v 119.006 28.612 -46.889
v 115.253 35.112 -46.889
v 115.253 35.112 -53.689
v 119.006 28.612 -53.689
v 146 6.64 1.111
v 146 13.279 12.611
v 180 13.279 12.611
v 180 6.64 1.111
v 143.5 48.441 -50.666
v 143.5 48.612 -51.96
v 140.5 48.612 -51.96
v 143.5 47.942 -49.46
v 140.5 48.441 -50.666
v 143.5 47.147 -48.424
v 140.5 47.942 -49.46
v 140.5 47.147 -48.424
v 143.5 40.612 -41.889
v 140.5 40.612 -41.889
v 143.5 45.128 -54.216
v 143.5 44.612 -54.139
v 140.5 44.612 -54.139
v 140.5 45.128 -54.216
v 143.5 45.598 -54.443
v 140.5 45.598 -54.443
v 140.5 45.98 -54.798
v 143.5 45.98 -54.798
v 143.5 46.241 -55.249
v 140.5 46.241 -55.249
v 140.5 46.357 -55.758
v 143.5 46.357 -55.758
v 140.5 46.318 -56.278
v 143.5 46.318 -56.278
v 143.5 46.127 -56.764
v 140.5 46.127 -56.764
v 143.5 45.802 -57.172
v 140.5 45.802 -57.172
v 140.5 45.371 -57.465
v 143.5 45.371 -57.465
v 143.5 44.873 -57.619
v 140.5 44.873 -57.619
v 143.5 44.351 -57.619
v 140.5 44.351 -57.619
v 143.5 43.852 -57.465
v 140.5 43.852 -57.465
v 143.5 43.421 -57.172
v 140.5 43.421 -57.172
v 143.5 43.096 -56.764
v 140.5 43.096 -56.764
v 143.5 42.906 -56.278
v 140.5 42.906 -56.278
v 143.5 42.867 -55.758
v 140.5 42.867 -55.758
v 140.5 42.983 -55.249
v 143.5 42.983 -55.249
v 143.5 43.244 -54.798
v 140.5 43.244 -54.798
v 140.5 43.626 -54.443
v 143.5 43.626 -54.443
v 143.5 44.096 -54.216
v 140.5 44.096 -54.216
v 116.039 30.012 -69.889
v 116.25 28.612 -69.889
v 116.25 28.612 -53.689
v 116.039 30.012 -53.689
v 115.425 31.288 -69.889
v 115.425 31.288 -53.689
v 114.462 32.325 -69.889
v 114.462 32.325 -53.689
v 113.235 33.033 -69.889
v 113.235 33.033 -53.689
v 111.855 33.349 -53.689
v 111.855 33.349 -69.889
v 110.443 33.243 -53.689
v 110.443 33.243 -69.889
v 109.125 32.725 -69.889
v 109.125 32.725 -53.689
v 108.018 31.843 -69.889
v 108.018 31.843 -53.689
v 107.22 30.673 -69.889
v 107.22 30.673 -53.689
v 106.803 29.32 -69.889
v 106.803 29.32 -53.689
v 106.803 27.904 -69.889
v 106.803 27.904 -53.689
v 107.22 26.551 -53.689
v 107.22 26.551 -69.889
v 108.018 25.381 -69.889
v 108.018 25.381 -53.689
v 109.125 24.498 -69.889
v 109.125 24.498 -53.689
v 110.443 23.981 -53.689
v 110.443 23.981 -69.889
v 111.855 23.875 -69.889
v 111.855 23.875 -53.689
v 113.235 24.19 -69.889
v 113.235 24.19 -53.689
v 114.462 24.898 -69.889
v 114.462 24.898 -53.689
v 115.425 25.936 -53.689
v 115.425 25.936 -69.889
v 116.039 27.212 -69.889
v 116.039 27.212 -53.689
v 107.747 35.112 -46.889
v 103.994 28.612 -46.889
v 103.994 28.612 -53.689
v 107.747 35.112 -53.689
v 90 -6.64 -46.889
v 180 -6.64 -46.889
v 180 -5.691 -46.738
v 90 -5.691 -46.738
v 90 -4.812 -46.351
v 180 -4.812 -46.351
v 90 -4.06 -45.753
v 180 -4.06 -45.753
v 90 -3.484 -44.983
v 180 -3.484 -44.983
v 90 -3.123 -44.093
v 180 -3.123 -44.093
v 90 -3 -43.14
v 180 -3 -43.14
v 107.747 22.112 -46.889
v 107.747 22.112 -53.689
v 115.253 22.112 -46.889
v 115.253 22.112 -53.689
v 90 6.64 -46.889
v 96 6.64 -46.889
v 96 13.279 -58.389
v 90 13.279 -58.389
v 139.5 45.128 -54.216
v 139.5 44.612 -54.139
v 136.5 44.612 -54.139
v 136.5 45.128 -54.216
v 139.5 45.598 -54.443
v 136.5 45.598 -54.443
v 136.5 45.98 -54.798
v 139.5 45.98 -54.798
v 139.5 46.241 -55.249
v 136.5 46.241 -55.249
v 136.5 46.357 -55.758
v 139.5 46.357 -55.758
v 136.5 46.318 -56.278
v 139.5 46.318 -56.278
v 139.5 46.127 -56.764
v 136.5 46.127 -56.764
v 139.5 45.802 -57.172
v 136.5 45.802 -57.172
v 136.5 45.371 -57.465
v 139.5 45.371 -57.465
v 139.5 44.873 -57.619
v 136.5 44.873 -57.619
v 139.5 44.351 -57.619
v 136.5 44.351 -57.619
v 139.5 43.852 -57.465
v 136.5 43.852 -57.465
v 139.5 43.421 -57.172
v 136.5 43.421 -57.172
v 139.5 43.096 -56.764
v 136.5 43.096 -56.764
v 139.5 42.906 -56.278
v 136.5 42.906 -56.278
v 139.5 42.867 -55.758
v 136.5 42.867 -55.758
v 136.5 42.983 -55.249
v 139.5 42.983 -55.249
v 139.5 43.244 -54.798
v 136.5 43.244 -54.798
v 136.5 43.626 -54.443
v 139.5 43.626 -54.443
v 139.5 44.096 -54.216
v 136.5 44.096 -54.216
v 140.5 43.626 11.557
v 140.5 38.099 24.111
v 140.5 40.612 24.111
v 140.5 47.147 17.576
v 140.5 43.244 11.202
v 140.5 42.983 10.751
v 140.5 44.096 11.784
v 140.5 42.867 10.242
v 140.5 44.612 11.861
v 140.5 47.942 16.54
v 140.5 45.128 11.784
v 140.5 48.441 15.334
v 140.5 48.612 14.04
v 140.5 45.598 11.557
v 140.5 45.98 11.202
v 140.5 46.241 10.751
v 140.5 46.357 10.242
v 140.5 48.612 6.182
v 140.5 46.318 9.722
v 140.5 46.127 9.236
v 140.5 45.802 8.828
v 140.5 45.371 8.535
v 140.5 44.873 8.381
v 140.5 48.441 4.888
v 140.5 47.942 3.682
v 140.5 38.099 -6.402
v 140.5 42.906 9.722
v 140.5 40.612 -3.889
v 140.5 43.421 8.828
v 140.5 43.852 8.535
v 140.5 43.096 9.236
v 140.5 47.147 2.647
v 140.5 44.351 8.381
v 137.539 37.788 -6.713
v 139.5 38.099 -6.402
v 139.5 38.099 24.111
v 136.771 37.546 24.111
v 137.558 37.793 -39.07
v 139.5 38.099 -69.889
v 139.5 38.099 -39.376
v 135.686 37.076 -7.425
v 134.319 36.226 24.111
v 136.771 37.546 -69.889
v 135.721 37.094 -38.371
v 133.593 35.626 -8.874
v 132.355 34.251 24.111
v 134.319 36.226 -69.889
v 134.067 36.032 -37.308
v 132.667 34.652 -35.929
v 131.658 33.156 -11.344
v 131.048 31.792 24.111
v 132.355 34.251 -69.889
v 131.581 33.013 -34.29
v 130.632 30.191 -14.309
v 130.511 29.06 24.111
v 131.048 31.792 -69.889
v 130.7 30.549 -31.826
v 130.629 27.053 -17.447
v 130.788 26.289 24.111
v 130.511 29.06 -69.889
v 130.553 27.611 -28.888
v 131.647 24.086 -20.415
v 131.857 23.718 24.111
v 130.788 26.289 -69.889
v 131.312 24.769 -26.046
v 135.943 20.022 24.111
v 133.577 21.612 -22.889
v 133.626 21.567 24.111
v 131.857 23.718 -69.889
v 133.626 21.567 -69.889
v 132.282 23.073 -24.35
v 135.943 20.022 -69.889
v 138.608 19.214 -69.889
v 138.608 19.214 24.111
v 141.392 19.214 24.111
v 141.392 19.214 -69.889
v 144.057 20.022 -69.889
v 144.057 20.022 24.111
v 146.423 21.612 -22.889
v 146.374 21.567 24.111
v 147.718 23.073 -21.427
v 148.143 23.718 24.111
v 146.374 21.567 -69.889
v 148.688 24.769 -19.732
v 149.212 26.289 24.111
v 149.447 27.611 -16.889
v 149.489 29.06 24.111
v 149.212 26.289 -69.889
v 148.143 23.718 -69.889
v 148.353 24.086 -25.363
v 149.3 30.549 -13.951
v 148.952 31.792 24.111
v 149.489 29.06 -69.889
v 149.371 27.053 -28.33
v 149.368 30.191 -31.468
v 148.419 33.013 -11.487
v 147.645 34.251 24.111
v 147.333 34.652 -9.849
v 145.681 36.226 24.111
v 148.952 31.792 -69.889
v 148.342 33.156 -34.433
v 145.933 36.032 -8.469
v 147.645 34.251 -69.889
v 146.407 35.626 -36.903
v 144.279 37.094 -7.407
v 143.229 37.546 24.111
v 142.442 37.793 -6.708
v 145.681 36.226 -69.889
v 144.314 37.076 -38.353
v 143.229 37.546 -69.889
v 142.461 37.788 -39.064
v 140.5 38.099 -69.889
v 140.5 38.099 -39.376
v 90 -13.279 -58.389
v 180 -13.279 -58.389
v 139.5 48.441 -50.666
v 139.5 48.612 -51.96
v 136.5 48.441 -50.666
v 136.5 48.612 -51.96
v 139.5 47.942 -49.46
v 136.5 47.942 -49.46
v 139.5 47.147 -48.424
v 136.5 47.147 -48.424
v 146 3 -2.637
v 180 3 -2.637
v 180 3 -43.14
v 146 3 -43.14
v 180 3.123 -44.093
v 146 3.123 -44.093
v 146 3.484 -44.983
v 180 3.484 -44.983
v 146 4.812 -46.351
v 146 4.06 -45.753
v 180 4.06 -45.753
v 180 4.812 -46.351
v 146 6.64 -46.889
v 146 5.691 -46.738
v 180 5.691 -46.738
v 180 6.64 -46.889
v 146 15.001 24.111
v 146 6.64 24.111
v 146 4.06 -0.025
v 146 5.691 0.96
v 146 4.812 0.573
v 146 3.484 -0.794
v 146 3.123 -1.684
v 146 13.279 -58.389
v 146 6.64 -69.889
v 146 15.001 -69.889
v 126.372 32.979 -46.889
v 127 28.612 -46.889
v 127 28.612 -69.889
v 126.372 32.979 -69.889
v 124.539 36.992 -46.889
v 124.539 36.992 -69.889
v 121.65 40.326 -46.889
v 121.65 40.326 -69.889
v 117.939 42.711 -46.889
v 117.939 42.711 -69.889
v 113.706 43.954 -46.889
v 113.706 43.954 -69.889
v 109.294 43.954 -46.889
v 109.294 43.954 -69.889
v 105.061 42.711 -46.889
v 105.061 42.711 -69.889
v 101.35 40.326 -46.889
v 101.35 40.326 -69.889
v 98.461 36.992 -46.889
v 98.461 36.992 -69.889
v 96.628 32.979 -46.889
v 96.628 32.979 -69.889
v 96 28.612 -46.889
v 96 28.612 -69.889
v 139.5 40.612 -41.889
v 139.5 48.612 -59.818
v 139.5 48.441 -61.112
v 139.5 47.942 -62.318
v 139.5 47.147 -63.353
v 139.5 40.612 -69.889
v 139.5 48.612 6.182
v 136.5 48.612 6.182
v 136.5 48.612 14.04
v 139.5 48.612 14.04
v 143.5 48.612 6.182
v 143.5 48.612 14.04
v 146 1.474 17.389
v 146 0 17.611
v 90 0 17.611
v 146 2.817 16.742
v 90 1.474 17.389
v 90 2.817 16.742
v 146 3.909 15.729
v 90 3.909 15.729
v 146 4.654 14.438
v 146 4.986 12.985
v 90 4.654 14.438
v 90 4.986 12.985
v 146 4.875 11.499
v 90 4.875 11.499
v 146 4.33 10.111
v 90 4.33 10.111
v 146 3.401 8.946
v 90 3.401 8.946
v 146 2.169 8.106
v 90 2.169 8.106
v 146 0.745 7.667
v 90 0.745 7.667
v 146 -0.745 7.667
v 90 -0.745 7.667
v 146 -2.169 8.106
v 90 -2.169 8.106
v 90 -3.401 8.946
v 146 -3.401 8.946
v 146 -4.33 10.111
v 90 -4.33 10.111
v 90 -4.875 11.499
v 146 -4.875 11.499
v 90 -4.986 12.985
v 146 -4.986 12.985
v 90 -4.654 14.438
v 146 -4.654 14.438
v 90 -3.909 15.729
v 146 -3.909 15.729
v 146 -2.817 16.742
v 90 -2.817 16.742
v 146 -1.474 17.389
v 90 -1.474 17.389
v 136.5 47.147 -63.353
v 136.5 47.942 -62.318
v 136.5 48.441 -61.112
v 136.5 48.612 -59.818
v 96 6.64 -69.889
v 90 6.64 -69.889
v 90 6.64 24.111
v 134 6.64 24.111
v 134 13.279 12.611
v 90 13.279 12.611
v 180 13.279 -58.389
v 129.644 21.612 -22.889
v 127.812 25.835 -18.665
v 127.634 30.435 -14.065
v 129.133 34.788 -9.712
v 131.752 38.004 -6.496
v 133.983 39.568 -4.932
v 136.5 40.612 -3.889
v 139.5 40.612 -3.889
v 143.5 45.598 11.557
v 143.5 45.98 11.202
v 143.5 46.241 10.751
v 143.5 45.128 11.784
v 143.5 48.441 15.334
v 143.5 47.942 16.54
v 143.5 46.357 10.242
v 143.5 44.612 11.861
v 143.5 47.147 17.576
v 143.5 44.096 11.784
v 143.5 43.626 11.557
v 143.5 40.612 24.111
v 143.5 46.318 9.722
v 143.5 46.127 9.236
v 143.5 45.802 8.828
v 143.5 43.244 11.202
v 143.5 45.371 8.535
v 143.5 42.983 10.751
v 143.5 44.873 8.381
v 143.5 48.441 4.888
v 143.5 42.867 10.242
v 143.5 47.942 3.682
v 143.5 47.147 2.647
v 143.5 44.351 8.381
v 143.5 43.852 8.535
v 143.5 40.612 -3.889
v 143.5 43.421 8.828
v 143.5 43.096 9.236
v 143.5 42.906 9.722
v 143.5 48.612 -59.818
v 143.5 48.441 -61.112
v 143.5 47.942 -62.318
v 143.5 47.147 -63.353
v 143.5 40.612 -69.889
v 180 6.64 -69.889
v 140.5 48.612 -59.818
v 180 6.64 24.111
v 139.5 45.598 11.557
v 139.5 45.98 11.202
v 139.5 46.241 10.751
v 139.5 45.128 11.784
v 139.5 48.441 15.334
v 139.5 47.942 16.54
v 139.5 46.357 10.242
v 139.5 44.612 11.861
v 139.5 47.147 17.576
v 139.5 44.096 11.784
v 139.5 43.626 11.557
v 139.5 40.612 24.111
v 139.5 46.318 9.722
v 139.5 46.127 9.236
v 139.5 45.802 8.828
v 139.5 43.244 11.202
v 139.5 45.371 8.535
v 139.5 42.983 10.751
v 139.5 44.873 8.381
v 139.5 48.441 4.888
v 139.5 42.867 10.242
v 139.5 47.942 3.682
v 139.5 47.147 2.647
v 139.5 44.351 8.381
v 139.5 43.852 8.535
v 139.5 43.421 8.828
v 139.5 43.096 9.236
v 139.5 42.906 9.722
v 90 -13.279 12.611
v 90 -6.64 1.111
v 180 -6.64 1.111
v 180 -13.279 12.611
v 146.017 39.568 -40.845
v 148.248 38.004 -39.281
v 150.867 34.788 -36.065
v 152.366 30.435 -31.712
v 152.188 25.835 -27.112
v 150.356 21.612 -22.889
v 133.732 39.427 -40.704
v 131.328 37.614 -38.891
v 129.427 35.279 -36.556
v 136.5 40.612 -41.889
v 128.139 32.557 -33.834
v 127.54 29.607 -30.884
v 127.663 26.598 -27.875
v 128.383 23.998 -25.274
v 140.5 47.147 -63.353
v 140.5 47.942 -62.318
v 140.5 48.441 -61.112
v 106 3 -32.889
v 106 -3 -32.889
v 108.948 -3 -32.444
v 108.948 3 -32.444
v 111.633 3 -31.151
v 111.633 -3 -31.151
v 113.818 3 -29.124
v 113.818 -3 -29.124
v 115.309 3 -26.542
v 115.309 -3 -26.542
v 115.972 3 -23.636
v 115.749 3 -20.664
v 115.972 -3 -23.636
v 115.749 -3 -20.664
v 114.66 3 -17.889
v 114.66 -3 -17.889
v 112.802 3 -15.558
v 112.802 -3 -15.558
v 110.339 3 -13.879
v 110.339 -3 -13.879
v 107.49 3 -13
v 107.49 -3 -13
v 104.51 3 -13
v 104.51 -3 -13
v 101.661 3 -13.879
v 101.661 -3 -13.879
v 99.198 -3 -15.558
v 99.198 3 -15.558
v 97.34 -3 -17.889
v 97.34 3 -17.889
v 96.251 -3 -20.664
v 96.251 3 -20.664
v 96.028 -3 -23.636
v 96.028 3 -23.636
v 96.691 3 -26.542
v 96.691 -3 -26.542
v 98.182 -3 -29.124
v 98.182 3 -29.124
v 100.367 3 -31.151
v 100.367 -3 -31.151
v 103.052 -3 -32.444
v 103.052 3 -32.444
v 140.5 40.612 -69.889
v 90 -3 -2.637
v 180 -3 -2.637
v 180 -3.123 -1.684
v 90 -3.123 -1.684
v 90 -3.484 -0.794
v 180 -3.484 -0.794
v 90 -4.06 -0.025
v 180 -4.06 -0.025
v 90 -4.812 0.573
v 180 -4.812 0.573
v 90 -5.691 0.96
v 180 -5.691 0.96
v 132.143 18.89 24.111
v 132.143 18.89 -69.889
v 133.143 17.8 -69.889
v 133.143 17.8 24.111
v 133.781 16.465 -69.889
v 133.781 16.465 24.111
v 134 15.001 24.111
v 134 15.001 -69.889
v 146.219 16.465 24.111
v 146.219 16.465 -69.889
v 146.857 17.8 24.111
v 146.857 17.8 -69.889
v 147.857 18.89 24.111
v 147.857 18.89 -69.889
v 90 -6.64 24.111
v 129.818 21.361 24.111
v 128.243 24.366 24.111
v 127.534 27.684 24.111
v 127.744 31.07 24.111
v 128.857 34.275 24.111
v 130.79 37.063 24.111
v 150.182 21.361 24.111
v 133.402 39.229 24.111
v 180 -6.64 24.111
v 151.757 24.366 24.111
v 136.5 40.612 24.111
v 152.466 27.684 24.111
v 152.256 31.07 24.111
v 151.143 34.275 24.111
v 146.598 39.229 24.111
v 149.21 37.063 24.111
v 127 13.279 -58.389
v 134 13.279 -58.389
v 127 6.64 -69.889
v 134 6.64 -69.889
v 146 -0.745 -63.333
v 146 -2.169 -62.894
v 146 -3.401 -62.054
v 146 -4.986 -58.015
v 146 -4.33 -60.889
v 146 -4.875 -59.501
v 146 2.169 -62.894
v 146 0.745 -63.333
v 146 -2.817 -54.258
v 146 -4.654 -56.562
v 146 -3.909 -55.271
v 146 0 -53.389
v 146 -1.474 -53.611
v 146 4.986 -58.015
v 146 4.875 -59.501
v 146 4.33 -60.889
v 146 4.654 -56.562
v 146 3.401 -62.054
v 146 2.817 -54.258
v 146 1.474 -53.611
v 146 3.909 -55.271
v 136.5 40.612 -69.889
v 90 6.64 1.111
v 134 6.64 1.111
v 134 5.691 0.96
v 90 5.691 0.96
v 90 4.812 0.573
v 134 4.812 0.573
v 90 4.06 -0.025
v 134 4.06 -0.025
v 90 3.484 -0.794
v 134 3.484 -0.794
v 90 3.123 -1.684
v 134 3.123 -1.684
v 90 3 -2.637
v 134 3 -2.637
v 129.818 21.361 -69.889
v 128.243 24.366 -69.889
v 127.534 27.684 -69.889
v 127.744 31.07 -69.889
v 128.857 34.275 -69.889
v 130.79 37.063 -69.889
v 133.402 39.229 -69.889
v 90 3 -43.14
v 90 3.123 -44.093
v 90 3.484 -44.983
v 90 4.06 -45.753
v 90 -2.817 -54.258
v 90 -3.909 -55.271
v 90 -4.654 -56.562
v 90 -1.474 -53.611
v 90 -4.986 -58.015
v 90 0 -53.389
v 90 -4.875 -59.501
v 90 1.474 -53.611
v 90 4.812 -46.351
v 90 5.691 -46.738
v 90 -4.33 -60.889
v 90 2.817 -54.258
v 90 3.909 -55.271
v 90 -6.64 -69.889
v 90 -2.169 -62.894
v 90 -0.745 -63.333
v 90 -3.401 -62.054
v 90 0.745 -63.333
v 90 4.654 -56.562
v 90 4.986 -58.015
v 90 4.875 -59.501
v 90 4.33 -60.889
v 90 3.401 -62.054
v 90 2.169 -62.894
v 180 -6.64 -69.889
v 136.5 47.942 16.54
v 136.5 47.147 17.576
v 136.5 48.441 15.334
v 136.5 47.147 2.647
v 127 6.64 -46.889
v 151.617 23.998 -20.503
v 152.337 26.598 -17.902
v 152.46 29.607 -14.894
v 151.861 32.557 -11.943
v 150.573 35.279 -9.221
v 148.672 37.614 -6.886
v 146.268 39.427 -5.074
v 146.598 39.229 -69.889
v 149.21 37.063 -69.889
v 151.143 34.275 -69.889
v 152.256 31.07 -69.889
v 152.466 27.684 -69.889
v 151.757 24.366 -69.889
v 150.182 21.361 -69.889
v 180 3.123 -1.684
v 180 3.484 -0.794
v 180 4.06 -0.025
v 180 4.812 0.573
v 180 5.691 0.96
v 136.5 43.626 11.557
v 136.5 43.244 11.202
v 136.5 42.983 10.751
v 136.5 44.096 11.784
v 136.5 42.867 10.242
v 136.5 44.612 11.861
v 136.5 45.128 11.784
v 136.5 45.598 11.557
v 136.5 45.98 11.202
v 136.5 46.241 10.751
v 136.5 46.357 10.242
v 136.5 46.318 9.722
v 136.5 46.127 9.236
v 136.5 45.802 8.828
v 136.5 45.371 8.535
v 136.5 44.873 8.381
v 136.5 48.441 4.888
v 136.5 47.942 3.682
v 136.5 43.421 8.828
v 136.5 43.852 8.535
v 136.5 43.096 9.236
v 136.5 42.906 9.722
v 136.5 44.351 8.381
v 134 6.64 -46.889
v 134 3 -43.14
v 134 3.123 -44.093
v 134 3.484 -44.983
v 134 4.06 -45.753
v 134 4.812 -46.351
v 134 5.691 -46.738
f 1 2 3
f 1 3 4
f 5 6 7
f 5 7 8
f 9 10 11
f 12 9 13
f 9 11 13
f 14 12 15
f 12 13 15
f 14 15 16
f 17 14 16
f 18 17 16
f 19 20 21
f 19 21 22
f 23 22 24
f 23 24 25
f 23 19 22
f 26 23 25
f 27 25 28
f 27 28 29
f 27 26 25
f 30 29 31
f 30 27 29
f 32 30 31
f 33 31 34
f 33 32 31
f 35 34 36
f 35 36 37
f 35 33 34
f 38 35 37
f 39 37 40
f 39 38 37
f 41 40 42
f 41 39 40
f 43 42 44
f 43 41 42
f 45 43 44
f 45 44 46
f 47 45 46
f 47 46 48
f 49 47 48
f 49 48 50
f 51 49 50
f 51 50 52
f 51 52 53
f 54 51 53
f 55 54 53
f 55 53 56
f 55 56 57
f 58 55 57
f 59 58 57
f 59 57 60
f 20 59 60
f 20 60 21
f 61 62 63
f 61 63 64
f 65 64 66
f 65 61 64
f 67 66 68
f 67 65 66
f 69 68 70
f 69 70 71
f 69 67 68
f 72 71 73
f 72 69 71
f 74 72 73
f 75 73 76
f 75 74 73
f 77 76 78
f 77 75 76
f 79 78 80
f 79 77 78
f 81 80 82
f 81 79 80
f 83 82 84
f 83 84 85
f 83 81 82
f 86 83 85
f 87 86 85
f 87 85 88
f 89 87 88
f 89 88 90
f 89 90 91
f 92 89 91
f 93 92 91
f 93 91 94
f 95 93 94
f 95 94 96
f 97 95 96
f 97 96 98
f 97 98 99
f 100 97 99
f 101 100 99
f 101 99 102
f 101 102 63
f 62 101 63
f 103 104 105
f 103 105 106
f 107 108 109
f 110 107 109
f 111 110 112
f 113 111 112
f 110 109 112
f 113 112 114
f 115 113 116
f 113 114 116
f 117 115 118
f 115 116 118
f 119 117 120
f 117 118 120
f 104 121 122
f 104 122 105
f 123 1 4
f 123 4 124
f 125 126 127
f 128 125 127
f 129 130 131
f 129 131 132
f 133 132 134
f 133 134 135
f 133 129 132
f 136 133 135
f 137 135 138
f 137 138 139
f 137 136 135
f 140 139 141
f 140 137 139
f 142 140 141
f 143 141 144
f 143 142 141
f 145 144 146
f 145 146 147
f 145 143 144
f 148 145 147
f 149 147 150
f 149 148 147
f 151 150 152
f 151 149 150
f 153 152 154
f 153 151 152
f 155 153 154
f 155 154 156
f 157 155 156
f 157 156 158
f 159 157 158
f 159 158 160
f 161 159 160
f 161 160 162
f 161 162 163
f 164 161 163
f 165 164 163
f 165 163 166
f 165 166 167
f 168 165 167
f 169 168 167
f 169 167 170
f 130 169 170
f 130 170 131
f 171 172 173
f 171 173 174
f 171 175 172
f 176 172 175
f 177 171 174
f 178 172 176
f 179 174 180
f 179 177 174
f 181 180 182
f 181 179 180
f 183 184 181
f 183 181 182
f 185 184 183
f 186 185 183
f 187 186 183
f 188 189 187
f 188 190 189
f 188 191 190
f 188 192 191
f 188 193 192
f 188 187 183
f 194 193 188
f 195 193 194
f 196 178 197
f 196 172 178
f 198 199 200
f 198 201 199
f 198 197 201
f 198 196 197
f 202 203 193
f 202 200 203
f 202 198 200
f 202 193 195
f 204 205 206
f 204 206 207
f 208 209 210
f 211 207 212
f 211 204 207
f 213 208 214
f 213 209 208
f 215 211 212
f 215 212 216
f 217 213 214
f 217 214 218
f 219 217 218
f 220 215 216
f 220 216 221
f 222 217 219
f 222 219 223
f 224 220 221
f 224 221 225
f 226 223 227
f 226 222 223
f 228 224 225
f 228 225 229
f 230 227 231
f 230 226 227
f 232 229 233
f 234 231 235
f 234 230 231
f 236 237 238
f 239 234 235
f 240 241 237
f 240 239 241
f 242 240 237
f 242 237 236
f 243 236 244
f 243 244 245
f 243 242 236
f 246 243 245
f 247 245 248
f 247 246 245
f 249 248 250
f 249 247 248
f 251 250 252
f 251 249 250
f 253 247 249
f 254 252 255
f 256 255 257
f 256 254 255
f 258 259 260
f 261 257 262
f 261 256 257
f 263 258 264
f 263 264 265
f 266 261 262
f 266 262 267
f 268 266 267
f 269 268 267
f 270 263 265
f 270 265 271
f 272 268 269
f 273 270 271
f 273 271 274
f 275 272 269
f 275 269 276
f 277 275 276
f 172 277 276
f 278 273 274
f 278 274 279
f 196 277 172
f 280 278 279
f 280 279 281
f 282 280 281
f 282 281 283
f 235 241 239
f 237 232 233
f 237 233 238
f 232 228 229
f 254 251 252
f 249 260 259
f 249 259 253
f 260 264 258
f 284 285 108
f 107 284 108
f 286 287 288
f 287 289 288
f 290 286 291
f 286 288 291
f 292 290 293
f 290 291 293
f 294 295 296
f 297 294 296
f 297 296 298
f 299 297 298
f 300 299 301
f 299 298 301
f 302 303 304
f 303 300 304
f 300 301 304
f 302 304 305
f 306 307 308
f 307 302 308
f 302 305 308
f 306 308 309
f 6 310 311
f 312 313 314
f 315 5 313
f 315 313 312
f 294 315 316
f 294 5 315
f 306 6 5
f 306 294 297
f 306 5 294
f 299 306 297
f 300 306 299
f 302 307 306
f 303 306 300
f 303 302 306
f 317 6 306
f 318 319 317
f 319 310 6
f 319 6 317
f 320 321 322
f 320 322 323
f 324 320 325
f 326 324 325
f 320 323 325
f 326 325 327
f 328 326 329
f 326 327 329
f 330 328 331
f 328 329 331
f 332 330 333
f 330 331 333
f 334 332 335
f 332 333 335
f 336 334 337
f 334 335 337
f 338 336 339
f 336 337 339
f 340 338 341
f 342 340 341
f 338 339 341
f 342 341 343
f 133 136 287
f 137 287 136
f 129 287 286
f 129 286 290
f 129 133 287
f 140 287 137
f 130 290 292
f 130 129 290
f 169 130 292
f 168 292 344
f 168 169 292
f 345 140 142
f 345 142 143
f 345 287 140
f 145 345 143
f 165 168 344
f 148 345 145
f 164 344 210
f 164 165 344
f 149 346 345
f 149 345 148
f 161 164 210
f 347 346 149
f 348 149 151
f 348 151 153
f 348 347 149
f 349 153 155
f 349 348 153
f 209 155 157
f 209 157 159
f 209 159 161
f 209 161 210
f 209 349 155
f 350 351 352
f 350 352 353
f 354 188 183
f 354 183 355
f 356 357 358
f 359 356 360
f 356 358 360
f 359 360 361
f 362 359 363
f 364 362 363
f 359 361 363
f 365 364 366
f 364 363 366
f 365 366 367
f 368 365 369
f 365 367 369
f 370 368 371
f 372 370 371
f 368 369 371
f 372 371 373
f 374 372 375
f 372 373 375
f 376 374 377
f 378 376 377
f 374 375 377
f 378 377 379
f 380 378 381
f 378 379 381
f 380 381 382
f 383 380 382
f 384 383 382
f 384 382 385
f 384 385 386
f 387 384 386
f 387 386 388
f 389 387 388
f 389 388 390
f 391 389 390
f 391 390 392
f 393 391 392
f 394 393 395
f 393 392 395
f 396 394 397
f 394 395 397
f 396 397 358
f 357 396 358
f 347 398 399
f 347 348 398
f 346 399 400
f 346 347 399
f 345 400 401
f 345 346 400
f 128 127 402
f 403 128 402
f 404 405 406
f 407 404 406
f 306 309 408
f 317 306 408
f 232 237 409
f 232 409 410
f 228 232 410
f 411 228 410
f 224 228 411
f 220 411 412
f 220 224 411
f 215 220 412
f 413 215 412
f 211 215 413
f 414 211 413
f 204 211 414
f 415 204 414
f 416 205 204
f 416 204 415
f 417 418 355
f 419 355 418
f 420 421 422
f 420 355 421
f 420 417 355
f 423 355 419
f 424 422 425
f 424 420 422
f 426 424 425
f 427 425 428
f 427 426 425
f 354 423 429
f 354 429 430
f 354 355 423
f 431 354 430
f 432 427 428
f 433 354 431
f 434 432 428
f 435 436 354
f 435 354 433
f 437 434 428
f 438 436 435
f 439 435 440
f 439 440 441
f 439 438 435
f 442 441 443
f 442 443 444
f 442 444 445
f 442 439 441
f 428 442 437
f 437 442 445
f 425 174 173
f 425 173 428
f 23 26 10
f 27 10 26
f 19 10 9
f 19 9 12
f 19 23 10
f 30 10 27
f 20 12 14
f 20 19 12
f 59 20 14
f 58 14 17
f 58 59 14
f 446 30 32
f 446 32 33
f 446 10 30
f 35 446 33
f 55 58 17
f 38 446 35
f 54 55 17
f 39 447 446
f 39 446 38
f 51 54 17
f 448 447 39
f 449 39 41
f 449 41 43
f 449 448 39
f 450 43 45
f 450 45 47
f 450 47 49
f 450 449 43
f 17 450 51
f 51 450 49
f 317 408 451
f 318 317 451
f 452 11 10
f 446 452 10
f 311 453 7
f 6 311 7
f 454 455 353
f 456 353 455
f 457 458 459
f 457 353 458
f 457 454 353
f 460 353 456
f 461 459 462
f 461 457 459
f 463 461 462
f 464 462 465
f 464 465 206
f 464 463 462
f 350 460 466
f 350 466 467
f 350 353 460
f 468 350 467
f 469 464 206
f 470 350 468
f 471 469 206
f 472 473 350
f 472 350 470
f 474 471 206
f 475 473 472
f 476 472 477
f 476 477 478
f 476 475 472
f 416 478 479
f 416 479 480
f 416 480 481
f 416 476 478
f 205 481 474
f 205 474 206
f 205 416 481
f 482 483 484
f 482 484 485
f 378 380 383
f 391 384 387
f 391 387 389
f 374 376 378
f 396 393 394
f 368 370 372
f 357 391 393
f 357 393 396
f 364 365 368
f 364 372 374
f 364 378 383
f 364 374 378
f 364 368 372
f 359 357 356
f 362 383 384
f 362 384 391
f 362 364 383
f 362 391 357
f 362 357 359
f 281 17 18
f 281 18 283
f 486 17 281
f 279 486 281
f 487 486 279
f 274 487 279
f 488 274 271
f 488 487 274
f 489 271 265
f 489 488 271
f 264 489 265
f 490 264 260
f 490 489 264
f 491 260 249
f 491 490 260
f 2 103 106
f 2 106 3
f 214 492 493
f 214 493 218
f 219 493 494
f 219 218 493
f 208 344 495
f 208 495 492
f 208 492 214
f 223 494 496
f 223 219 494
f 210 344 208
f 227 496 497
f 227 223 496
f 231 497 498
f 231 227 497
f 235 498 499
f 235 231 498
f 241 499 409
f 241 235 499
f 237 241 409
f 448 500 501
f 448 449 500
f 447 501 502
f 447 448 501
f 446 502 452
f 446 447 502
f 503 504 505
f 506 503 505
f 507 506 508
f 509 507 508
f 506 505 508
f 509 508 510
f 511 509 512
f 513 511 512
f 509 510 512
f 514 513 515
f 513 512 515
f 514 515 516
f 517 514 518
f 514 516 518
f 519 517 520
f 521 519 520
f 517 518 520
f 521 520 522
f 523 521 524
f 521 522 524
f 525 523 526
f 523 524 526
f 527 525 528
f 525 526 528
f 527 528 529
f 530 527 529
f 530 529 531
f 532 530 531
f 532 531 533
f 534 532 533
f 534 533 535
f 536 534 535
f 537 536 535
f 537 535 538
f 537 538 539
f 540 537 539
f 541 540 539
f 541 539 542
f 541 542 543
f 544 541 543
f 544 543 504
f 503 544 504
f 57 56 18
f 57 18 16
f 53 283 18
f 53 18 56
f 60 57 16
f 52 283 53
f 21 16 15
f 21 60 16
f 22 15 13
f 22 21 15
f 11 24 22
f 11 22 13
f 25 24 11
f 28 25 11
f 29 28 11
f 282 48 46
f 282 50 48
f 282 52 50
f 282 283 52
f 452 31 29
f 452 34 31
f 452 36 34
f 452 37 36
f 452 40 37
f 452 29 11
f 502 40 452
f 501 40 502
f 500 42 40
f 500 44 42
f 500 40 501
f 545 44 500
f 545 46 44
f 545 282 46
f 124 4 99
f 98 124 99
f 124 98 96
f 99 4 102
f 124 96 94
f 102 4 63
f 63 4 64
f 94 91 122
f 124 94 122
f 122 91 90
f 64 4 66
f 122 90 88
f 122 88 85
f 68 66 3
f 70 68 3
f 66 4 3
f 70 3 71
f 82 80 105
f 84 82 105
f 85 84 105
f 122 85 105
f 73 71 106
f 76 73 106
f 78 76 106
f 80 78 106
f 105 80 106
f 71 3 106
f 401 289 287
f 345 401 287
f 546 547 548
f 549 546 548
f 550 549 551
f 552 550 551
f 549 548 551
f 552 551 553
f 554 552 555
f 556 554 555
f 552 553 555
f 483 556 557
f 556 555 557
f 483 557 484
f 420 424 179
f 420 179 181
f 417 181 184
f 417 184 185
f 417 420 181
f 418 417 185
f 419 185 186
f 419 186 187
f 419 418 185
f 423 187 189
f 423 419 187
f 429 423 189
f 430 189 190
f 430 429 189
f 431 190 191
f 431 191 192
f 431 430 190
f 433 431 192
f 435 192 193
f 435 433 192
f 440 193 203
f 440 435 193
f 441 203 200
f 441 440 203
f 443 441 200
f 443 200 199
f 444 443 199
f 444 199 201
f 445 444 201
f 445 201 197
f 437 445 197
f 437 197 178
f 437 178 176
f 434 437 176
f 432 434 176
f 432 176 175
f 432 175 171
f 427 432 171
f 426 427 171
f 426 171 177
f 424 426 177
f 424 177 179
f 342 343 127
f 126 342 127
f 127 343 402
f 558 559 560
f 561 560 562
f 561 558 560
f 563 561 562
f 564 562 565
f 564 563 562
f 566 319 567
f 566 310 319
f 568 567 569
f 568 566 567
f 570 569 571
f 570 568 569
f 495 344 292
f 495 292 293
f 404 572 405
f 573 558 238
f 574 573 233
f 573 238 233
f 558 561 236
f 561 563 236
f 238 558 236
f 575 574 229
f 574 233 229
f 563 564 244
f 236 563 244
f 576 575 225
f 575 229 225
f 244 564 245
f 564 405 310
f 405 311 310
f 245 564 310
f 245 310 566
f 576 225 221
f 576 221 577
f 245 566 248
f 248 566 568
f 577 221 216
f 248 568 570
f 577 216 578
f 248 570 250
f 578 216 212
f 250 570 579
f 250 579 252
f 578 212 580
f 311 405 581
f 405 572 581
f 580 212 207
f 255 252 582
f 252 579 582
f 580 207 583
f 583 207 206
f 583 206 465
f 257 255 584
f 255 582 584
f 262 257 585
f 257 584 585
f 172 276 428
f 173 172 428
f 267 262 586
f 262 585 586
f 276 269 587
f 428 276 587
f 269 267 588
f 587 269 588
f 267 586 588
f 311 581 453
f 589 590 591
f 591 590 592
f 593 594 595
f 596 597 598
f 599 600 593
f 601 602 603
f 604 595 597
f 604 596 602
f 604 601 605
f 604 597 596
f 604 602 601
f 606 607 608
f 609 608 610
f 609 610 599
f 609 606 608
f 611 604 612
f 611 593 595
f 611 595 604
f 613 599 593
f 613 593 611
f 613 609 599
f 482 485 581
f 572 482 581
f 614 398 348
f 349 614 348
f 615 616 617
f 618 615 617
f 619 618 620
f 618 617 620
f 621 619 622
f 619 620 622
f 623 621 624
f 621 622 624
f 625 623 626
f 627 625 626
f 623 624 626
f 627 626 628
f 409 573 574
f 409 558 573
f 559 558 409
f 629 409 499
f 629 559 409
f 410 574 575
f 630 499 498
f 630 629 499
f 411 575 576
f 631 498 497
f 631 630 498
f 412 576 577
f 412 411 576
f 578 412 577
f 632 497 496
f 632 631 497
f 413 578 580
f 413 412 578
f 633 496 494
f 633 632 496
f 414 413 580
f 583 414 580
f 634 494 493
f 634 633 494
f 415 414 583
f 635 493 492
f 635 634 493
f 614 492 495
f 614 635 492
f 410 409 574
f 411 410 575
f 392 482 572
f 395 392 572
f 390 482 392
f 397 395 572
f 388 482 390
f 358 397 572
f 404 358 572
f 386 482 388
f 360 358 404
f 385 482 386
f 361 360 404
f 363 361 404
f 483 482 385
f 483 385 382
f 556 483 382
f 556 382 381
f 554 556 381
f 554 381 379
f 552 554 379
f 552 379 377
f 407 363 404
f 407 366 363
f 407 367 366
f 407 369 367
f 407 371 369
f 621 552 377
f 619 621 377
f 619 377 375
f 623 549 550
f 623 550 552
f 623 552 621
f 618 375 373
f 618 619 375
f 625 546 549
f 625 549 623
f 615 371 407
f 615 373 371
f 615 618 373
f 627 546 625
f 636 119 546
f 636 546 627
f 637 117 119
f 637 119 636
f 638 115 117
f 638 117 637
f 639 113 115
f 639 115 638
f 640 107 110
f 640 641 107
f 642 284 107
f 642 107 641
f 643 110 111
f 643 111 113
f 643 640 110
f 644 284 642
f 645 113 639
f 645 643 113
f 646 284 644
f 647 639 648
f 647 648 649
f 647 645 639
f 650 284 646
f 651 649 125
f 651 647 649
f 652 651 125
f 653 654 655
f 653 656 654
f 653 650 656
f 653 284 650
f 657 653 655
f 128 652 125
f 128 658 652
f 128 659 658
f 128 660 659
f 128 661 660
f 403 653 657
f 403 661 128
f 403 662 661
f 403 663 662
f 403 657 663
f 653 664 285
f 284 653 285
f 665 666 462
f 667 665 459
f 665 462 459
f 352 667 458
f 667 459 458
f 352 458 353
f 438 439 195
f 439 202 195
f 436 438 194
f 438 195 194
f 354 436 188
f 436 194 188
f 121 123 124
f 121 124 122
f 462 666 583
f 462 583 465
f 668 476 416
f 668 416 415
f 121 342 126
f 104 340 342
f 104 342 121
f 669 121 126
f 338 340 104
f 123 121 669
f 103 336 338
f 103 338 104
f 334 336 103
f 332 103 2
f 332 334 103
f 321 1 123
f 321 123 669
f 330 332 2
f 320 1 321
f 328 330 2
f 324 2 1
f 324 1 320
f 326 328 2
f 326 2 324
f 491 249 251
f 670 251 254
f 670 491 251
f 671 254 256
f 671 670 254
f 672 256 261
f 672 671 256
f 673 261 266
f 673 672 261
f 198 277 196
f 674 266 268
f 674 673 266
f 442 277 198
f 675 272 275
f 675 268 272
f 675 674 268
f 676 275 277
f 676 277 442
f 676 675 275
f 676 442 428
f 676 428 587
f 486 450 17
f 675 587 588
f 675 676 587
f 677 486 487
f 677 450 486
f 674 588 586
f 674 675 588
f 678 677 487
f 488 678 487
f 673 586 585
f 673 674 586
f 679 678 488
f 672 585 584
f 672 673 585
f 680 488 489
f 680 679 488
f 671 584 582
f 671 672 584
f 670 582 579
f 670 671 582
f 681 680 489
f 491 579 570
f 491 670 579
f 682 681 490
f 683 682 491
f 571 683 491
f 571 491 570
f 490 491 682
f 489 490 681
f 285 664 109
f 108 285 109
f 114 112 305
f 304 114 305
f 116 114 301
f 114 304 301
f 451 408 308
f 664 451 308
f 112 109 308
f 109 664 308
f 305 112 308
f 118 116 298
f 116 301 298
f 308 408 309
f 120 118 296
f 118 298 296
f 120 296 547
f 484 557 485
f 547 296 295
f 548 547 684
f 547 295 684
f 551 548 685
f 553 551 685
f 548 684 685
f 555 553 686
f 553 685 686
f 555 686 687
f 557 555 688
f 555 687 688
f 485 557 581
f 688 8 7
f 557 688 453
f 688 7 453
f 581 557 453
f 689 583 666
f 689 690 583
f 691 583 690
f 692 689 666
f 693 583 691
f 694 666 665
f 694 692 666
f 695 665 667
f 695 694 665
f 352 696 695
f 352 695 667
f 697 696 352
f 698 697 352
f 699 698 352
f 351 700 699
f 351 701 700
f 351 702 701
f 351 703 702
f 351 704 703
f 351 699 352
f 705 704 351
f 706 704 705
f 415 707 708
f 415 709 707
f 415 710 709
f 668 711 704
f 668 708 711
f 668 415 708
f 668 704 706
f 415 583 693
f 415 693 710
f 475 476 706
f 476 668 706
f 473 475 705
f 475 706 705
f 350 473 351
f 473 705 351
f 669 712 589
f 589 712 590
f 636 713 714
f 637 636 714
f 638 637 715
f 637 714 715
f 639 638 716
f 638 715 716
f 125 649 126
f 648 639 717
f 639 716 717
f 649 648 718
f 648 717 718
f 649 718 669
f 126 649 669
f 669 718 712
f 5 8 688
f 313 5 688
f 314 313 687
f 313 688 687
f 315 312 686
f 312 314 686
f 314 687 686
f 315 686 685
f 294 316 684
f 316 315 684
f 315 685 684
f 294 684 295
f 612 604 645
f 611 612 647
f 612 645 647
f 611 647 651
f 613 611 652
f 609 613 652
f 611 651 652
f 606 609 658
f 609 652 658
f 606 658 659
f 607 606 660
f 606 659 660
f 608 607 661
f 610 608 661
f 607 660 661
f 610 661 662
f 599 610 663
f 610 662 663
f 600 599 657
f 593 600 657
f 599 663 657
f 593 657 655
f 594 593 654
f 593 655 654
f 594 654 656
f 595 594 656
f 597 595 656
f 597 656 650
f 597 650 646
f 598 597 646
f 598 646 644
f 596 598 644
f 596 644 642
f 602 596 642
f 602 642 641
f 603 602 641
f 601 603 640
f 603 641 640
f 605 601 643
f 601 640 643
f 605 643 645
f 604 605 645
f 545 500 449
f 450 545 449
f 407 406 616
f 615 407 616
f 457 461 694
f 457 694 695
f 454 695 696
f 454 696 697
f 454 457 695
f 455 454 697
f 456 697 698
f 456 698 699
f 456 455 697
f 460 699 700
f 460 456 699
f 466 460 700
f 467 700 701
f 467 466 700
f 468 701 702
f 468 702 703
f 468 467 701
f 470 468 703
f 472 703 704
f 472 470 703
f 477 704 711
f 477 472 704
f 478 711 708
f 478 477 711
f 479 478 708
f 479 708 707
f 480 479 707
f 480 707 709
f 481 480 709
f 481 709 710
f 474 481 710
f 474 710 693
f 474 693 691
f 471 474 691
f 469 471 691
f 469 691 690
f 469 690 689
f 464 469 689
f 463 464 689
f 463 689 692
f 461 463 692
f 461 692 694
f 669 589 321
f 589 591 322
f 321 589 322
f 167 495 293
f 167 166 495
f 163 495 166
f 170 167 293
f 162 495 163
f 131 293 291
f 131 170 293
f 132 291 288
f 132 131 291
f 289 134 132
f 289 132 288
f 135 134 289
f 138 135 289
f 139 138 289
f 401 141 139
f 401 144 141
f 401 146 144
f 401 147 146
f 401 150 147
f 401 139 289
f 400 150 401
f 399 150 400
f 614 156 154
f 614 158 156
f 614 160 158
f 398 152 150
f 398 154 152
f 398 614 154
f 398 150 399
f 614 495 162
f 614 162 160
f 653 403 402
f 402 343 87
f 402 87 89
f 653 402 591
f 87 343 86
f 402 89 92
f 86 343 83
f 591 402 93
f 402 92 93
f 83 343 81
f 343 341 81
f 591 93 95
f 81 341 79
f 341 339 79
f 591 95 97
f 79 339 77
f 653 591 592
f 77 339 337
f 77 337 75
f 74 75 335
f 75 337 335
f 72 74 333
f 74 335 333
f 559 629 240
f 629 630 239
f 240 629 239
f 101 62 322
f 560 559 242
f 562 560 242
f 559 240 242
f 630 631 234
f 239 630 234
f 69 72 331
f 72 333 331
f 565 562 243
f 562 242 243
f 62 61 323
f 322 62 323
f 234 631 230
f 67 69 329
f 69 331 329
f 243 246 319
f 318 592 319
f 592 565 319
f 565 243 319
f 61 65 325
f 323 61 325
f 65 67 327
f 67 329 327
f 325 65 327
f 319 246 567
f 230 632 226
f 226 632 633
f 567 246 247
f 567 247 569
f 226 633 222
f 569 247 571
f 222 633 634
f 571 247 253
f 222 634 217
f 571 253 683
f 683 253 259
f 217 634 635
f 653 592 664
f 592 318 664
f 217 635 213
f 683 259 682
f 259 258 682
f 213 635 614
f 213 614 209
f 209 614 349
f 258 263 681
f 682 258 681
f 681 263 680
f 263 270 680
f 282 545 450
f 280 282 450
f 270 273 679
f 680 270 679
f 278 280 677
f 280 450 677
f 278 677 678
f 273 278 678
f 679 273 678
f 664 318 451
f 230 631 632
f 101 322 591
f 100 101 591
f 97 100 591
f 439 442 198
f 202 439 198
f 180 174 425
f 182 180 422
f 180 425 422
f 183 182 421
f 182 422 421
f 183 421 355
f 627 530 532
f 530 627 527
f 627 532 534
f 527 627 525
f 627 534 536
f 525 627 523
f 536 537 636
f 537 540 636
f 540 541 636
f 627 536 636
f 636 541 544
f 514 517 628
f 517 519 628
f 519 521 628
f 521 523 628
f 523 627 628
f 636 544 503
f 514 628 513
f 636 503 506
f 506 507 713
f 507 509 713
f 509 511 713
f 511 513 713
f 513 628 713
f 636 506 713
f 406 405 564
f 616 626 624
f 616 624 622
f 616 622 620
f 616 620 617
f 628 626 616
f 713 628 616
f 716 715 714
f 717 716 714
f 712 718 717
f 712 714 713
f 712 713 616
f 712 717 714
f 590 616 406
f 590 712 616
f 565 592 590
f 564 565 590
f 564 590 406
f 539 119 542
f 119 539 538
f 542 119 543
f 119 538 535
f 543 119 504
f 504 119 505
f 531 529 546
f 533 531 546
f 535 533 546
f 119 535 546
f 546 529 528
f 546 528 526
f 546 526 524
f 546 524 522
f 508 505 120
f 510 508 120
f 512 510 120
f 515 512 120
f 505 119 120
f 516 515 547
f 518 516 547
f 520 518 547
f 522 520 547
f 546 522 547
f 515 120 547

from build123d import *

# Parameters (mm, degrees)
BOSS_EXTRUDE1_DEPTH = 90
FILLET3_R           = 3.75
BOSS_EXTRUDE2_REACH = 132.814
FILLET4_R           = 5
SKETCH5_R           = 4.75
BOSS_EXTRUDE7_DEPTH = 23
CUT_EXTRUDE2_DEPTH  = 6.8
CUT_EXTRUDE3_REACH  = 125.885
SKETCH7_R           = 1.75
CHAMFER1_SIZE       = 8
FILLET5_R           = 5
CUT_EXTRUDE4_START  = -94
SKETCH8_W           = 125.822690829
SKETCH8_H           = 77.860904062
CUT_EXTRUDE4_DEPTH  = 94
SKETCH9_R           = 10
CUT_EXTRUDE5_DEPTH  = 10
SKETCH10_R          = 5
CUT_EXTRUDE6_DEPTH  = 56


# Read off the part's stored shape, not the designer's step: Mirror1
# Some blends are built 0.0001 mm under size
with BuildPart() as part:
    # Sketch2 → Boss-Extrude1 (new body)
    with BuildSketch(Plane(origin=(0, 0, 0), x_dir=(0, 0, -1), z_dir=(1, 0, 0))):
        Polygon((-1.111261719, 3), (46.888738281, 3), (46.888738281, 6.639528096), (58.388738281, 13.279056191), (69.888738281, 6.639528096), (69.888738281, -6.639528096), (58.388738281, -13.279056191), (46.888738281, -6.639528096), (46.888738281, -3), (-1.111261719, -3), (-1.111261719, -6.639528096), (-12.611261719, -13.279056191), (-24.111261719, -6.639528096), (-24.111261719, 6.639528096), (-12.611261719, 13.279056191), (-1.111261719, 6.639528096), align=None)
    extrude(amount=BOSS_EXTRUDE1_DEPTH)

    # Fillet3
    # the kernel refuses this fillet: 3.75 mm, written as the material it adds along each edge
    with BuildSketch(Plane(origin=(0, -3, 1.111261719), x_dir=(0, 0, -1), z_dir=(1, 0, 0)), Plane(origin=(0, 3, -46.888738281), x_dir=(0, 0, 1), z_dir=(1, 0, 0))) as fillet3_piece_1:
        with BuildLine():
            CenterArc((3.748372441, -3.75), FILLET3_R, 90, 88.311869402)
            Line((0, -3.639528096), (-0.074967449, -3.637318658))
            ThreePointArc((-0.074967449, -3.637318658), (-0.075, -1.819764048), (-0.075, 0))
            Line((-0.075, 0), (0, 0.075))
            Line((0, 0.075), (3.748372441, 0.075))
            Line((3.748372441, 0.075), (3.748372441, 0))
        make_face()
    extrude(amount=90)
    with BuildSketch(Plane(origin=(0, -3, -46.888738281), x_dir=(0, -1, 0), z_dir=(1, 0, 0))) as fillet3_piece_2:
        with BuildLine():
            CenterArc((3.75, -3.748372441), FILLET3_R, 91.688130598, 88.311869402)
            Line((0, -3.748372441), (-0.075, -3.748372441))
            Line((-0.075, -3.748372441), (-0.075, 0))
            Line((-0.075, 0), (0, 0.075))
            ThreePointArc((0, 0.075), (1.819764048, 0.075), (3.637318658, 0.074967449))
            Line((3.637318658, 0.074967449), (3.639528096, 0))
        make_face()
    extrude(amount=90)
    with BuildSketch(Plane(origin=(0, 3, 1.111261719), x_dir=(0, 0, -1), z_dir=(1, 0, 0))) as fillet3_piece_3:
        with BuildLine():
            CenterArc((3.748372441, 3.75), FILLET3_R, 181.688130598, 88.311869402)
            Line((0, 3.639528096), (-0.074967449, 3.637318658))
            ThreePointArc((-0.074967449, 3.637318658), (-0.075, 1.819764048), (-0.075, 0))
            Line((-0.075, 0), (0, -0.075))
            Line((0, -0.075), (3.748372441, -0.075))
            Line((3.748372441, -0.075), (3.748372441, 0))
        make_face()
    extrude(amount=90)

    # Boss-Extrude2: up to this face of the body (flat: up to its plane)
    boss_extrude2_end = Plane(part.part.faces().sort_by_distance((45, 0, 24.111261719))[0])
    # Sketch4 → Boss-Extrude2 (add, up to the picked face)
    with BuildSketch(Plane(origin=(0, 0, -69.888738281), x_dir=(-1, 0, 0), z_dir=(0, 0, -1)), mode=Mode.PRIVATE) as boss_extrude2_sk1:
        with BuildLine():
            Line((-46, 3), (-46, 17.64593212))
            ThreePointArc((-46, 17.64593212), (-52.426589902, 29.964512656), (-43.5, 40.611788219))
            Line((-43.5, 40.611788219), (-43.5, 48.611788219))
            Line((-43.5, 48.611788219), (-40.5, 48.611788219))
            Line((-40.5, 48.611788219), (-40.5, 41.101784216))
            Line((-40.5, 41.101784216), (-40.5, 38.0986212))
            ThreePointArc((-40.5, 38.0986212), (-40, 19.111788219), (-39.5, 38.0986212))
            Line((-39.5, 38.0986212), (-39.5, 41.101784216))
            Line((-39.5, 41.101784216), (-39.5, 48.611788219))
            Line((-39.5, 48.611788219), (-36.5, 48.611788219))
            Line((-36.5, 48.611788219), (-36.5, 40.611788219))
            ThreePointArc((-36.5, 40.611788219), (-27.573410098, 29.964512656), (-34, 17.64593212))
            Line((-34, 17.64593212), (-34, 3))
            Line((-34, 3), (-46, 3))
        make_face()
    boss_extrude2_tool1 = split(extrude(boss_extrude2_sk1.sketch, amount=-BOSS_EXTRUDE2_REACH, mode=Mode.PRIVATE), bisect_by=boss_extrude2_end, keep=Keep.BOTH, mode=Mode.PRIVATE)
    add(boss_extrude2_tool1.solids().sort_by(Axis((45.479862, 10.322966, -69.888738), (0, 0, 1)))[0])

    # Fillet4
    fillet4_edges = [part.edges().sort_by_distance(p)[0] for p in [
        (34, 17.64593212, -22.888738281),
        (46, 17.64593212, -22.888738281),
    ]]
    fillet(fillet4_edges, radius=FILLET4_R)

    # Sketch5 → Boss-Extrude7 (add)
    with BuildSketch(Plane(origin=(0, 0, -69.888738281), x_dir=(-1, 0, 0), z_dir=(0, 0, -1))):
        with BuildLine():
            Line((-84, 28.611788219), (-84, 6.639528096))
            Line((-84, 6.639528096), (-53, 6.639528096))
            Line((-53, 6.639528096), (-53, 28.611788219))
            ThreePointArc((-53, 28.611788219), (-68.5, 44.111788219), (-84, 28.611788219))
        make_face()
        with Locations((-68.5, 28.611788219)):
            Circle(SKETCH5_R, mode=Mode.SUBTRACT)
    extrude(amount=-BOSS_EXTRUDE7_DEPTH)

    # Sketch6 → Cut-Extrude2 (cut)
    with BuildSketch(Plane.XY.offset(-46.888738281)):
        Polygon((60.994446501, 28.611788219), (64.74722325, 22.111788219), (72.25277675, 22.111788219), (76.005553499, 28.611788219), (72.25277675, 35.111788219), (64.74722325, 35.111788219), align=None)
    extrude(amount=-CUT_EXTRUDE2_DEPTH, mode=Mode.SUBTRACT)

    # Cut-Extrude3: up to this face of the body (flat: up to its plane)
    cut_extrude3_end = Plane(part.part.faces().sort_by_distance((53, 19.187065128, -58.388738281))[0])
    # Sketch7 → Cut-Extrude3 (cut, up to the picked face)
    with BuildSketch(Plane.ZY, mode=Mode.PRIVATE) as cut_extrude3_sk1:
        with Locations((10.111261719, 44.611788219)):
            Circle(SKETCH7_R)
    cut_extrude3_tool1 = split(extrude(cut_extrude3_sk1.sketch, amount=-CUT_EXTRUDE3_REACH, mode=Mode.PRIVATE), bisect_by=cut_extrude3_end, keep=Keep.BOTH, mode=Mode.PRIVATE)
    # Sketch7 → Cut-Extrude3 (cut, up to the picked face)
    with BuildSketch(Plane.ZY, mode=Mode.PRIVATE) as cut_extrude3_sk2:
        with Locations((-55.888738281, 44.611788219)):
            Circle(SKETCH7_R)
    cut_extrude3_tool2 = split(extrude(cut_extrude3_sk2.sketch, amount=-CUT_EXTRUDE3_REACH, mode=Mode.PRIVATE), bisect_by=cut_extrude3_end, keep=Keep.BOTH, mode=Mode.PRIVATE)
    # Sketch7 → Cut-Extrude3 (cut, up to the picked face)
    with BuildSketch(Plane.ZY, mode=Mode.PRIVATE) as cut_extrude3_sk3:
        Polygon((-41.888738281, 40.611788219), (-22.888738281, 21.611788219), (-3.888738281, 40.611788219), (-3.888738281, 48.611788219), (-41.888738281, 48.611788219), align=None)
    cut_extrude3_tool3 = split(extrude(cut_extrude3_sk3.sketch, amount=-CUT_EXTRUDE3_REACH, mode=Mode.PRIVATE), bisect_by=cut_extrude3_end, keep=Keep.BOTH, mode=Mode.PRIVATE)
    add(cut_extrude3_tool1.solids().sort_by(Axis((0, 44.611788, 10.111262), (1, 0, 0)))[0], mode=Mode.SUBTRACT)
    add(cut_extrude3_tool2.solids().sort_by(Axis((0, 44.611788, -55.888738), (1, 0, 0)))[0], mode=Mode.SUBTRACT)
    add(cut_extrude3_tool3.solids().sort_by(Axis((0, 39.002264, -22.888738), (1, 0, 0)))[0], mode=Mode.SUBTRACT)

    # Chamfer1
    chamfer1_edges = [part.edges().sort_by_distance(p)[0] for p in [
        (42, 48.611788219, -41.888738281),
        (42, 48.611788219, -69.888738281),
        (42, 48.611788219, -3.888738281),
        (42, 48.611788219, 24.111261719),
        (38, 48.611788219, -41.888738281),
        (38, 48.611788219, -69.888738281),
        (38, 48.611788219, -3.888738281),
        (38, 48.611788219, 24.111261719),
    ]]
    chamfer(chamfer1_edges, length=CHAMFER1_SIZE - 0.0001)  # a hair under: the kernel refuses the full size

    # Fillet5
    fillet5_edges = [part.edges().sort_by_distance(p)[0] for p in [
        (42, 48.611788219, -49.888638281),
        (42, 48.611788219, -61.888838281),
        (38, 48.611788219, -49.888638281),
        (38, 48.611788219, -61.888838281),
        (42, 48.611788219, 16.111361719),
        (42, 48.611788219, 4.111161719),
        (38, 48.611788219, 16.111361719),
        (38, 48.611788219, 4.111161719),
    ]]
    fillet(fillet5_edges, radius=FILLET5_R)

    # Mirror1: part across plane


with BuildPart() as part_1:
    add(part.part)
    add(part.part.mirror(Plane.ZY.offset(-90)))

    # Sketch8 → Cut-Extrude4 (cut)
    with BuildSketch(Plane.XY.offset(24.111261719).offset(CUT_EXTRUDE4_START)):
        with Locations((27.088654585, 25.65139584)):
            Rectangle(SKETCH8_W, SKETCH8_H)
    extrude(amount=CUT_EXTRUDE4_DEPTH, mode=Mode.SUBTRACT)

    # Sketch9 → Cut-Extrude5 (cut)
    with BuildSketch(Plane.XZ.offset(3)):
        with Locations(Location((106, -22.888738281, 0), (0, 0, 270))):
            Circle(SKETCH9_R)
    extrude(amount=-CUT_EXTRUDE5_DEPTH, mode=Mode.SUBTRACT)

    # Sketch10 → Cut-Extrude6 (cut)
    with BuildSketch(Plane.ZY.offset(-90)):
        with Locations((12.611261719, 0)):
            Circle(SKETCH10_R)
        with Locations((-58.388738281, 0)):
            Circle(SKETCH10_R)
    extrude(amount=-CUT_EXTRUDE6_DEPTH, mode=Mode.SUBTRACT)


solid = part_1.part
